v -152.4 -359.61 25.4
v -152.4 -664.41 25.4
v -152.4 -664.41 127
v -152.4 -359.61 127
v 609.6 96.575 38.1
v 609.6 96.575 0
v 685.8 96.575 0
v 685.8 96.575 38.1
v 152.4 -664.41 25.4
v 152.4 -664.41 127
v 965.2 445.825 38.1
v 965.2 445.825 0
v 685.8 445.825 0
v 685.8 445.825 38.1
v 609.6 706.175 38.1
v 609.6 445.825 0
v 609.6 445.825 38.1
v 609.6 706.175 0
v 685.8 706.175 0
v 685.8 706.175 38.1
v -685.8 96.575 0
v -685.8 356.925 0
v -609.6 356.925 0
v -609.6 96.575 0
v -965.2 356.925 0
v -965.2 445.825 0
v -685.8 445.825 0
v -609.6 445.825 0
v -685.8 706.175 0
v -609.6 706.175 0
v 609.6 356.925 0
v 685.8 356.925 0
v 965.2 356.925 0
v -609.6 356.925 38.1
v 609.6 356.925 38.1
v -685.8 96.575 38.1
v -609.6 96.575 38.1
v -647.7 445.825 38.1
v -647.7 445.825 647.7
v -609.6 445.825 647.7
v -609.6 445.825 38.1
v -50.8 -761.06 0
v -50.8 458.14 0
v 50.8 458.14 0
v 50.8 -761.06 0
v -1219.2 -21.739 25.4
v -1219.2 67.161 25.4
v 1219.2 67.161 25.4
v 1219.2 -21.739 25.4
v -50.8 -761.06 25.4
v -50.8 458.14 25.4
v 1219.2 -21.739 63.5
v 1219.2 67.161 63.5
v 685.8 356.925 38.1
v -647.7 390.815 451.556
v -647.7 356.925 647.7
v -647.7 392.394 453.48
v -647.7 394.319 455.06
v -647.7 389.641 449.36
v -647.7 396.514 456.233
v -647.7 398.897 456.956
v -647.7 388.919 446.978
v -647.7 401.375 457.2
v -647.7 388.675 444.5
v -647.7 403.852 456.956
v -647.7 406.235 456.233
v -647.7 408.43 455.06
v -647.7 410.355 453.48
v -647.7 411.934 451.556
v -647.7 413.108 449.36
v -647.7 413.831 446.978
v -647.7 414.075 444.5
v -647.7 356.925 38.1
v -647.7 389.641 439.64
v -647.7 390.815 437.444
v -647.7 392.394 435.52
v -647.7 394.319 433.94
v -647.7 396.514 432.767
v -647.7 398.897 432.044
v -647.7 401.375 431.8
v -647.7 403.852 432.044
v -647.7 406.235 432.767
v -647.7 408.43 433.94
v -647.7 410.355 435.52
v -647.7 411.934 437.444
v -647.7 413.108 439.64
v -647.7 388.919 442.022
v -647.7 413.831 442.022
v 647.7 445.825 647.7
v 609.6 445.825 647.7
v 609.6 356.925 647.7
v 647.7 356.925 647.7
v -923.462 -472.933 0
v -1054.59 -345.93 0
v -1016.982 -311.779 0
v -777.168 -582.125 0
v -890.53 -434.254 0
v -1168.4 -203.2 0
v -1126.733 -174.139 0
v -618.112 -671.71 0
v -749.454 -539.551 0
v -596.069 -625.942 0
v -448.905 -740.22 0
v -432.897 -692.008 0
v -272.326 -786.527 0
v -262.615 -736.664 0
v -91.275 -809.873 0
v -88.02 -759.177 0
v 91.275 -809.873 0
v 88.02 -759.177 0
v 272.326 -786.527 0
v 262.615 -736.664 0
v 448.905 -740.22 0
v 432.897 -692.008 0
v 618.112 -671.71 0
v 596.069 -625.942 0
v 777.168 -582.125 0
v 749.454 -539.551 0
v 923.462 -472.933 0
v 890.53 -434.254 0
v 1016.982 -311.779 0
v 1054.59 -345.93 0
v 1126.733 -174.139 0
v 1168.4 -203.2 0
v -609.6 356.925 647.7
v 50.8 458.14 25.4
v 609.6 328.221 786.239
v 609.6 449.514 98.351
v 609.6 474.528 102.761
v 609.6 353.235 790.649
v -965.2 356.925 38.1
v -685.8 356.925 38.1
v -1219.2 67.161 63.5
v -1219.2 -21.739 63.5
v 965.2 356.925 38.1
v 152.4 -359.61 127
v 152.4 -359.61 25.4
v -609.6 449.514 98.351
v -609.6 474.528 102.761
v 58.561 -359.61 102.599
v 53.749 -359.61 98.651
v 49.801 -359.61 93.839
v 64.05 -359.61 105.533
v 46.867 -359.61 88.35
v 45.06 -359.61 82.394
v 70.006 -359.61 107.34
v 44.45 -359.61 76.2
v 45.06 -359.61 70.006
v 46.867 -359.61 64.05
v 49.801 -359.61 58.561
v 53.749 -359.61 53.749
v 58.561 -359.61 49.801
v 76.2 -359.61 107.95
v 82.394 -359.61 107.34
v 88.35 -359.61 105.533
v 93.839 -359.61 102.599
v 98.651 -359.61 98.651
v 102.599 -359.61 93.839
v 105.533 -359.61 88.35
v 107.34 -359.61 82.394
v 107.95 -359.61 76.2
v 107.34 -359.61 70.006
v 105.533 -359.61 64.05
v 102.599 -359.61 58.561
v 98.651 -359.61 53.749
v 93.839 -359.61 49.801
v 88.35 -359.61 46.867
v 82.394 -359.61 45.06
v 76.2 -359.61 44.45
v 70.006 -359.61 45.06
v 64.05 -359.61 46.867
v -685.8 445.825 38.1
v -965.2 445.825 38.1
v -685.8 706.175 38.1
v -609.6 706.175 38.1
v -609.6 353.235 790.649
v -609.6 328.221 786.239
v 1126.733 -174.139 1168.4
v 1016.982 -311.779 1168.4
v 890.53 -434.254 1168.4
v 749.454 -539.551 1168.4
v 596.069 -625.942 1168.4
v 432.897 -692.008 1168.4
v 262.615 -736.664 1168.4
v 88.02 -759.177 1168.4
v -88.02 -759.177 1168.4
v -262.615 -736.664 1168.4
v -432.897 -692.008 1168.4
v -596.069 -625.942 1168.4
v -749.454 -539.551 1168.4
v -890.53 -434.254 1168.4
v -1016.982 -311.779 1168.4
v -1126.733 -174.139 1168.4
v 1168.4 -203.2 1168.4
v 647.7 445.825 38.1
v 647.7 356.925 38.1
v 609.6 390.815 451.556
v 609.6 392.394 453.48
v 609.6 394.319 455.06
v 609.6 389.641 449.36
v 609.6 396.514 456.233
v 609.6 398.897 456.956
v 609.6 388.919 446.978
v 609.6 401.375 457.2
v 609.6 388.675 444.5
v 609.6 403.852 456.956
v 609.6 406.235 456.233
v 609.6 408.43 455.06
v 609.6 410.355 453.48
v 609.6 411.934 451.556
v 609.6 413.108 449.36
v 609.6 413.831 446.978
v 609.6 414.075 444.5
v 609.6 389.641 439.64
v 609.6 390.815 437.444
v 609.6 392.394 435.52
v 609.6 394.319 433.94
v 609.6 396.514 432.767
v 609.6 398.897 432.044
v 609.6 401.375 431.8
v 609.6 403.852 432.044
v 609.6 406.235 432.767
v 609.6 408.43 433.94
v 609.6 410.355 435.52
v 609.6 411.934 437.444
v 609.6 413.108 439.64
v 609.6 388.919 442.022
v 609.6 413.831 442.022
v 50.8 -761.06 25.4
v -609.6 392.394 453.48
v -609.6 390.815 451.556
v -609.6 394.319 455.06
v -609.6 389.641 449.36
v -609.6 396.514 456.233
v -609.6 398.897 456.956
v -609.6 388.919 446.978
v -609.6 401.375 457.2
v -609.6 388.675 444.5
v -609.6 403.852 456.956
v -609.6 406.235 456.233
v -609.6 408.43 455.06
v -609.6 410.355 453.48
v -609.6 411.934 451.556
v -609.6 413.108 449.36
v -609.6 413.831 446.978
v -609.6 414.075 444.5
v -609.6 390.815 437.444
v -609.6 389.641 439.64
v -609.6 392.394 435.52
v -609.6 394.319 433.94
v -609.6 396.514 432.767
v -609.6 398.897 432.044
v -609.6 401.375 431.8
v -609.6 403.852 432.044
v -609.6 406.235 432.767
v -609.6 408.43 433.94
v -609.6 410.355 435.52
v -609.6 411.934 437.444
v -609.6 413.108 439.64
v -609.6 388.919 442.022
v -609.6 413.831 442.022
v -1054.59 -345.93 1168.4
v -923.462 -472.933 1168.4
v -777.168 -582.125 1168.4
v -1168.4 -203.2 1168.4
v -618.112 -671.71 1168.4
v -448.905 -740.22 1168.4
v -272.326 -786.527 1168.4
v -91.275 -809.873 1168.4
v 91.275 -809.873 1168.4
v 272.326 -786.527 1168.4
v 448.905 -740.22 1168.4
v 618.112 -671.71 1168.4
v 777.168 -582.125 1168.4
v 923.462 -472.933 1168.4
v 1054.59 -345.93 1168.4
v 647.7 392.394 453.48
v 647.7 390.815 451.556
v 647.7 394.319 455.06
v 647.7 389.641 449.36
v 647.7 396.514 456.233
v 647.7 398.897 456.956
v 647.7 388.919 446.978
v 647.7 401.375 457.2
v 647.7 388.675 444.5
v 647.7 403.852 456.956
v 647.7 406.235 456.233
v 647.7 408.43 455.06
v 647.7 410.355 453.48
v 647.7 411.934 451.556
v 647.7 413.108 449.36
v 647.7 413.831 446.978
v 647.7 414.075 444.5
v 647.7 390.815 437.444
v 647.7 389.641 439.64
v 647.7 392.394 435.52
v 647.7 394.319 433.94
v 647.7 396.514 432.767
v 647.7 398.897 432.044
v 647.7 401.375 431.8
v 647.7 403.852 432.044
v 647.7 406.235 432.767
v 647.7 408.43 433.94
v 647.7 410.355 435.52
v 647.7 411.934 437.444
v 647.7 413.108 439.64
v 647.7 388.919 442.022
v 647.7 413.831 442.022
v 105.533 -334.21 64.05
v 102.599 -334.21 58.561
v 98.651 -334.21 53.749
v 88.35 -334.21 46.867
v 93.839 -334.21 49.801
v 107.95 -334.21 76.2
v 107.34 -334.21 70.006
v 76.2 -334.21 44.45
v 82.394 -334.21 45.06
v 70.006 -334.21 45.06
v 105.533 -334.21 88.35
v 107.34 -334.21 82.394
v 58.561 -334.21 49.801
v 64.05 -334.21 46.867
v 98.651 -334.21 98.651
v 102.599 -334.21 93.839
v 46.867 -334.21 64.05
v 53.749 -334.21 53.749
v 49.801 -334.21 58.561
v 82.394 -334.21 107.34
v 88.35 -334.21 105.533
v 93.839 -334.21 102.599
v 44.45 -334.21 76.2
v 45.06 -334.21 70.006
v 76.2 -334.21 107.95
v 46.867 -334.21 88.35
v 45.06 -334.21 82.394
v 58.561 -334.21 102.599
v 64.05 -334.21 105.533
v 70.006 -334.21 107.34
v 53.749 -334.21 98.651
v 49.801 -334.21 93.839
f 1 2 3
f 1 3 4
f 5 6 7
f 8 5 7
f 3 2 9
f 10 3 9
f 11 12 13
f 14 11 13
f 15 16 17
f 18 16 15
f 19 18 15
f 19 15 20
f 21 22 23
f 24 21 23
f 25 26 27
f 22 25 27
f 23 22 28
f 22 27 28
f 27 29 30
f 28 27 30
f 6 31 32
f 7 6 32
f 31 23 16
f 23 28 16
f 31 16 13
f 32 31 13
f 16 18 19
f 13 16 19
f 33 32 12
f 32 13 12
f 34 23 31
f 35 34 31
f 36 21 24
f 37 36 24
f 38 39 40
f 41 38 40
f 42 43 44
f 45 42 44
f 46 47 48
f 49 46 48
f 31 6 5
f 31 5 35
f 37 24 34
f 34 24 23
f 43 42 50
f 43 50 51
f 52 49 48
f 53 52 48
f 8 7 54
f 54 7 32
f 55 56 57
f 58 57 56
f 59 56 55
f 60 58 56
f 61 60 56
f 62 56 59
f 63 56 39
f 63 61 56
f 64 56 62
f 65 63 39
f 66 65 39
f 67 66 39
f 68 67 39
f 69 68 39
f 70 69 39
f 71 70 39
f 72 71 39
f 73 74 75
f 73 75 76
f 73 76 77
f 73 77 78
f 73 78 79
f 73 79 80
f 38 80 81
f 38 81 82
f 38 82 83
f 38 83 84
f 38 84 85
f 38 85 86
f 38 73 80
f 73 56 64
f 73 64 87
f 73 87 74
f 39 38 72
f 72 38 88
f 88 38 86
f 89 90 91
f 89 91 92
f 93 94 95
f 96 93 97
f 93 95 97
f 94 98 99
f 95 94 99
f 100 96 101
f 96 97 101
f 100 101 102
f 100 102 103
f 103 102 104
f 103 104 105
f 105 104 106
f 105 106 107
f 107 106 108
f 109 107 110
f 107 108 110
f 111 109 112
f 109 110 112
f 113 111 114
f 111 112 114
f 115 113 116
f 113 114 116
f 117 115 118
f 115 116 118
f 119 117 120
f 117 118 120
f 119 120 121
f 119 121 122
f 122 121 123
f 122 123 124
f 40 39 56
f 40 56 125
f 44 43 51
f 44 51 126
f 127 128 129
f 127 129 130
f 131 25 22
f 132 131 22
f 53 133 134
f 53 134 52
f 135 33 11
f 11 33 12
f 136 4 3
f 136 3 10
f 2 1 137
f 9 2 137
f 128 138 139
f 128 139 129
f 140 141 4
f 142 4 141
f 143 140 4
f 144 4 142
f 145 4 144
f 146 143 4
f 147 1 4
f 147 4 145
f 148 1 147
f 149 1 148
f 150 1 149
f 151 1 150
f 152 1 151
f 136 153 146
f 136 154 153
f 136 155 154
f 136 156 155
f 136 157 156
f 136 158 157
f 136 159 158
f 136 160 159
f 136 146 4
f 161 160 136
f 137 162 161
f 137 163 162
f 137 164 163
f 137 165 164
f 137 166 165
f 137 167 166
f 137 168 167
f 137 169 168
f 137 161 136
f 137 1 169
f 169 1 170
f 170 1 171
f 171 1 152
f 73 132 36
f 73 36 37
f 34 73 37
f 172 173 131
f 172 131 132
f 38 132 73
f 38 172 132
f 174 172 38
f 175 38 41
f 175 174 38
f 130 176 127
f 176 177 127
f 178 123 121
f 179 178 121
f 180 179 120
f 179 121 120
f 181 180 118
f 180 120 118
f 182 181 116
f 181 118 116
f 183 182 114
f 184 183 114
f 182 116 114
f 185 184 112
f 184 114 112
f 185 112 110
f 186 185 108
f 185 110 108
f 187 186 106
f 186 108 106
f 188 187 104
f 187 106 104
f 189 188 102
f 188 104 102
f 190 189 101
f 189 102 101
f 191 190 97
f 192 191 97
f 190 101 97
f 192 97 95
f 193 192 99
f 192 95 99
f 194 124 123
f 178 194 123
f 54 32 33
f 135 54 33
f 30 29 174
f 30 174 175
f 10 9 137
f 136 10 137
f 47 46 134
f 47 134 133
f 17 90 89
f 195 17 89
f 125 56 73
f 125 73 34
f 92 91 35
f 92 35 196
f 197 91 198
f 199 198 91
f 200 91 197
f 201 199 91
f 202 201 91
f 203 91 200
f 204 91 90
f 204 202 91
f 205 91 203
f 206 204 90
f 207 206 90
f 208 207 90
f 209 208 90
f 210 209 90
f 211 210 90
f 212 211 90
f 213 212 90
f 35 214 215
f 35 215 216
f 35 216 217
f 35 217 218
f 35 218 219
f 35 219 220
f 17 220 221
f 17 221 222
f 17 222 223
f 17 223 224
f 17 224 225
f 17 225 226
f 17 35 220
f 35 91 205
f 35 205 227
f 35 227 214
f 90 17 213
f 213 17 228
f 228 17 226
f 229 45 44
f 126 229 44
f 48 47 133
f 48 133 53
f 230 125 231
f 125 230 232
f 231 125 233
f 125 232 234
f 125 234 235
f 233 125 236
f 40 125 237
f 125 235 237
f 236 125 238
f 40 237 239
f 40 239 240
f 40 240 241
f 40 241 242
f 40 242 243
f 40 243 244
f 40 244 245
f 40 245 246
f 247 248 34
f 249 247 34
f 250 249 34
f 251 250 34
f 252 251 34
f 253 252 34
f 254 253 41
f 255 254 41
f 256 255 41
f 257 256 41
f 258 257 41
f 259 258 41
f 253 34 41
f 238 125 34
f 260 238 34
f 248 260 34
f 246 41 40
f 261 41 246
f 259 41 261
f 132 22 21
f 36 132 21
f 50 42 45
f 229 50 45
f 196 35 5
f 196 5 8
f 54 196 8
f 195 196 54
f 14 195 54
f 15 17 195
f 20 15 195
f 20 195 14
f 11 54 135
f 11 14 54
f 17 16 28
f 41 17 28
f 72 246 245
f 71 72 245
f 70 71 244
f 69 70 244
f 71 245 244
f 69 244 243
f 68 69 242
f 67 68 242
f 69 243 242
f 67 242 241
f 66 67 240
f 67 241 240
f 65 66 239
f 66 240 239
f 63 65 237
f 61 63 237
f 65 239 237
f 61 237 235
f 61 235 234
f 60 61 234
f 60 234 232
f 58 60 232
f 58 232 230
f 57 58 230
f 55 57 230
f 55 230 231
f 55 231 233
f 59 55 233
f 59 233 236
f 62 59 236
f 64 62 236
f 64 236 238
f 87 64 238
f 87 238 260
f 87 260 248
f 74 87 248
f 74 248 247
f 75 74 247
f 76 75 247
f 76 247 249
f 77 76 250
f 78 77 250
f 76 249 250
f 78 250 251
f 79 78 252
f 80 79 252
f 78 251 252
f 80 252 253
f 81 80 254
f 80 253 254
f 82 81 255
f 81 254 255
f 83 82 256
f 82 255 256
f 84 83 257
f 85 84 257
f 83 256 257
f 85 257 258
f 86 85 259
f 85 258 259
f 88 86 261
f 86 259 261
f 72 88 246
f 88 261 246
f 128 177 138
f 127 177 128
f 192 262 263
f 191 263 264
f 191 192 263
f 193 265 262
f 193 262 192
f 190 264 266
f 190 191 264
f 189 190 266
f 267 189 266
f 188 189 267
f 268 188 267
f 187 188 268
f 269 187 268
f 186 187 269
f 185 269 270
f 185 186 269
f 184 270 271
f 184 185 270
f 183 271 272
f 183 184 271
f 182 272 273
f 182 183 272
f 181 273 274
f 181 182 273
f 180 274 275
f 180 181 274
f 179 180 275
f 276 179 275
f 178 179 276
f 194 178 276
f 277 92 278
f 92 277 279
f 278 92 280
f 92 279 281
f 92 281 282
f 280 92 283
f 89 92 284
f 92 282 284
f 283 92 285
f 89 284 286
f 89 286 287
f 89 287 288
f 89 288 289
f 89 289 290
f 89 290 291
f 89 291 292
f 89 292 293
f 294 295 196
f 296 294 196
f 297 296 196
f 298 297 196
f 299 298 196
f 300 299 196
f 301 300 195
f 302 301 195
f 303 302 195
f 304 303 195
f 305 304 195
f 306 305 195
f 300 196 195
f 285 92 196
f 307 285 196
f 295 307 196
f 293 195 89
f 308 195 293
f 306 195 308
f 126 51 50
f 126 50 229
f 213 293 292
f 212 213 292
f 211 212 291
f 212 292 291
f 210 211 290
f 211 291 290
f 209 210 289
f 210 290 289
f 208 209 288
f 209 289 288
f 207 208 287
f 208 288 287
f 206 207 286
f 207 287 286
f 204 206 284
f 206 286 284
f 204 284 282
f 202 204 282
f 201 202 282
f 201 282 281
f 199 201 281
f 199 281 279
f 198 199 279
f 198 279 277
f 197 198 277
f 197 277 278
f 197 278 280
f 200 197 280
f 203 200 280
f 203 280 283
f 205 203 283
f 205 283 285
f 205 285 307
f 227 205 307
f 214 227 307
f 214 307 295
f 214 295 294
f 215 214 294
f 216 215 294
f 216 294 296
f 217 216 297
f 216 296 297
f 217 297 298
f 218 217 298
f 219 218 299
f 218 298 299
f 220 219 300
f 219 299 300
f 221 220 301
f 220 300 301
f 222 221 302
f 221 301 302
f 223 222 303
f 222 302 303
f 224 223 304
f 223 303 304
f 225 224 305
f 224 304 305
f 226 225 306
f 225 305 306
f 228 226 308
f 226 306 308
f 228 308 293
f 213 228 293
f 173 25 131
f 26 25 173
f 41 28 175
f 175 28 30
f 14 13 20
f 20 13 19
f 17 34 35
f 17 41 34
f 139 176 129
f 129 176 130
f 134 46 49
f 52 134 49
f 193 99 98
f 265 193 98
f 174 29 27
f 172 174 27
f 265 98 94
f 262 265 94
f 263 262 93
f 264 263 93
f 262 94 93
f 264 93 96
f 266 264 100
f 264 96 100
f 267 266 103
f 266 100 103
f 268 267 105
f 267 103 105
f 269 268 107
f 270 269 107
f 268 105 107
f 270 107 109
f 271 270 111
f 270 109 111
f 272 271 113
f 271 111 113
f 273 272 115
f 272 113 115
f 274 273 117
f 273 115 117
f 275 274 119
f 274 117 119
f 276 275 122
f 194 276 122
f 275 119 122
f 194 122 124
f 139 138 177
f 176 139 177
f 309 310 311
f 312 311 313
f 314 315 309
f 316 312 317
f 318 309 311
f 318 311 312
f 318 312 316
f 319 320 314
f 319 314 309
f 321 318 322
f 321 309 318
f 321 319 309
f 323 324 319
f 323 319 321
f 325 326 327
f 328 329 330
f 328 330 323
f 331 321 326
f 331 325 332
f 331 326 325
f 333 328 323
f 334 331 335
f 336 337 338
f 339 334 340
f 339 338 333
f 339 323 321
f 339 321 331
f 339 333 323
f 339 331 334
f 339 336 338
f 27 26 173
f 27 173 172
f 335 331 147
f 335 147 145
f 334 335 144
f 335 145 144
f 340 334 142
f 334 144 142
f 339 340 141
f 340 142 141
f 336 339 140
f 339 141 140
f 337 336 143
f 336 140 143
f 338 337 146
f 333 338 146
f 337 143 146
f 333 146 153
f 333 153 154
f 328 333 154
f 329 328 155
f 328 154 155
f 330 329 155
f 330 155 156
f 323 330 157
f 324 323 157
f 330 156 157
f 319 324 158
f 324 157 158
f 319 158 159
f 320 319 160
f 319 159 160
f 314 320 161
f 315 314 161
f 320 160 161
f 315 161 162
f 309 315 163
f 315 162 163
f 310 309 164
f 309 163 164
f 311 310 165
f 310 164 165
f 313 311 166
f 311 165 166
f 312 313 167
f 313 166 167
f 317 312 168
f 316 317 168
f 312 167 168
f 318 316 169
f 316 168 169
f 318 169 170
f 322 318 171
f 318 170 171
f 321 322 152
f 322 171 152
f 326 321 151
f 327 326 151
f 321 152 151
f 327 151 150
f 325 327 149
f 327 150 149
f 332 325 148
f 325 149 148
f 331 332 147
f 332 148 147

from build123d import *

# Parameters (mm, degrees)
F1_DEPTH  = 1168.4
F2_W      = 101.6
F2_H      = 1219.2
F3_DEPTH  = 25.4
F4_W      = 304.8
F4_H      = 304.8
F5_DEPTH  = 101.6
F6_R      = 31.75
F7_DEPTH  = 25.4
F8_W      = 2438.4
F8_H      = 88.9
F9_DEPTH  = 38.1
F10_W     = 76.2
F10_H     = 260.35
F10_W_2   = 1219.2
F10_H_2   = 88.9
F10_W_3   = 279.4
F11_DEPTH = 38.1
F12_W     = 38.1
F12_H     = 88.9
F13_DEPTH = 609.6
F14_R     = 12.7
F15_DEPTH = 1866.901
F19_W     = 1219.2
F19_H     = 698.5
F20_DEPTH = 12.7


with BuildPart() as f1:
    # F0 (on Top) → F1 (new body)
    with BuildSketch(Plane.XY):
        with BuildLine():
            Line((-1126.7334323923, -174.1390787519), (-1168.4, -203.2))
            ThreePointArc((-1168.4, -203.2), (0, -812.8), (1168.4, -203.2))
            Line((1168.4, -203.2), (1126.7334323923, -174.1390787519))
            ThreePointArc((1126.7334323923, -174.1390787519), (0, -762), (-1126.7334323923, -174.1390787519))
        make_face()
    extrude(amount=F1_DEPTH)


with BuildPart() as f3:
    # F2 (on Top) → F3 (new body)
    with BuildSketch(Plane.XY):
        with Locations((0, -151.4603874385)):
            Rectangle(F2_W, F2_H)
    extrude(amount=F3_DEPTH)


with BuildPart() as f5:
    # F4 (on face) → F5 (new body)
    with BuildSketch(Plane.XY.offset(25.4)):
        with Locations((0, -512.0104551315)):
            Rectangle(F4_W, F4_H)
    extrude(amount=F5_DEPTH)

    # F6 (on face) → F7 (join)
    with BuildSketch(Plane(origin=(0, -359.6104551315, 0), x_dir=(-1, 0, 0), z_dir=(0, 1, 0))):
        with Locations((-76.2, 76.2)):
            Circle(F6_R)
    extrude(amount=F7_DEPTH)


with BuildPart() as f9:
    # F8 (on face) → F9 (new body)
    with BuildSketch(Plane.XY.offset(25.4)):
        with Locations((0, 22.7109212481)):
            Rectangle(F8_W, F8_H)
    extrude(amount=F9_DEPTH)


with BuildPart() as f11:
    # F10 (on Top) → F11 (new body)
    with BuildSketch(Plane.XY):
        with Locations((647.7, 226.7495486736)):
            Rectangle(F10_W, F10_H)
        with Locations((0, 401.3745486736)):
            Rectangle(F10_W_2, F10_H_2)
        with Locations((647.7, 401.3745486736)):
            Rectangle(F10_W, F10_H_2)
        with Locations((825.5, 401.3745486736)):
            Rectangle(F10_W_3, F10_H_2)
        with Locations((647.7, 575.9995486736)):
            Rectangle(F10_W, F10_H)
        with Locations((-647.7, 401.3745486736)):
            Rectangle(F10_W, F10_H_2)
        with Locations((-647.7, 226.7495486736)):
            Rectangle(F10_W, F10_H)
        with Locations((-647.7, 575.9995486736)):
            Rectangle(F10_W, F10_H)
        with Locations((-825.5, 401.3745486736)):
            Rectangle(F10_W_3, F10_H_2)
    extrude(amount=F11_DEPTH)

    # F12 (on face) → F13 (join)
    with BuildSketch(Plane.XY.offset(38.1)):
        with Locations((628.65, 401.3745486736)):
            Rectangle(F12_W, F12_H)
        with Locations((-628.65, 401.3745486736)):
            Rectangle(F12_W, F12_H)
    extrude(amount=F13_DEPTH)

    # F14 (on face) → F15 (cut, through all)
    with BuildSketch(Plane.YZ.offset(647.7)):
        with Locations((401.3745486736, 444.5)):
            Circle(F14_R)
    extrude(amount=-F15_DEPTH, mode=Mode.SUBTRACT)


with BuildPart() as f20:
    # F19 (on line) → F20 (new body, symmetric)
    with BuildSketch(Plane(origin=(0, 465.2856019709, 82.0424053626), x_dir=(1, 0, 0), z_dir=(0, -0.984807753, -0.1736481777))):
        with Locations((0, 368.0490872749)):
            Rectangle(F19_W, F19_H)
    extrude(amount=F20_DEPTH, both=True)


solid = Compound([f1.part, f3.part, f5.part, f9.part, f11.part, f20.part])
